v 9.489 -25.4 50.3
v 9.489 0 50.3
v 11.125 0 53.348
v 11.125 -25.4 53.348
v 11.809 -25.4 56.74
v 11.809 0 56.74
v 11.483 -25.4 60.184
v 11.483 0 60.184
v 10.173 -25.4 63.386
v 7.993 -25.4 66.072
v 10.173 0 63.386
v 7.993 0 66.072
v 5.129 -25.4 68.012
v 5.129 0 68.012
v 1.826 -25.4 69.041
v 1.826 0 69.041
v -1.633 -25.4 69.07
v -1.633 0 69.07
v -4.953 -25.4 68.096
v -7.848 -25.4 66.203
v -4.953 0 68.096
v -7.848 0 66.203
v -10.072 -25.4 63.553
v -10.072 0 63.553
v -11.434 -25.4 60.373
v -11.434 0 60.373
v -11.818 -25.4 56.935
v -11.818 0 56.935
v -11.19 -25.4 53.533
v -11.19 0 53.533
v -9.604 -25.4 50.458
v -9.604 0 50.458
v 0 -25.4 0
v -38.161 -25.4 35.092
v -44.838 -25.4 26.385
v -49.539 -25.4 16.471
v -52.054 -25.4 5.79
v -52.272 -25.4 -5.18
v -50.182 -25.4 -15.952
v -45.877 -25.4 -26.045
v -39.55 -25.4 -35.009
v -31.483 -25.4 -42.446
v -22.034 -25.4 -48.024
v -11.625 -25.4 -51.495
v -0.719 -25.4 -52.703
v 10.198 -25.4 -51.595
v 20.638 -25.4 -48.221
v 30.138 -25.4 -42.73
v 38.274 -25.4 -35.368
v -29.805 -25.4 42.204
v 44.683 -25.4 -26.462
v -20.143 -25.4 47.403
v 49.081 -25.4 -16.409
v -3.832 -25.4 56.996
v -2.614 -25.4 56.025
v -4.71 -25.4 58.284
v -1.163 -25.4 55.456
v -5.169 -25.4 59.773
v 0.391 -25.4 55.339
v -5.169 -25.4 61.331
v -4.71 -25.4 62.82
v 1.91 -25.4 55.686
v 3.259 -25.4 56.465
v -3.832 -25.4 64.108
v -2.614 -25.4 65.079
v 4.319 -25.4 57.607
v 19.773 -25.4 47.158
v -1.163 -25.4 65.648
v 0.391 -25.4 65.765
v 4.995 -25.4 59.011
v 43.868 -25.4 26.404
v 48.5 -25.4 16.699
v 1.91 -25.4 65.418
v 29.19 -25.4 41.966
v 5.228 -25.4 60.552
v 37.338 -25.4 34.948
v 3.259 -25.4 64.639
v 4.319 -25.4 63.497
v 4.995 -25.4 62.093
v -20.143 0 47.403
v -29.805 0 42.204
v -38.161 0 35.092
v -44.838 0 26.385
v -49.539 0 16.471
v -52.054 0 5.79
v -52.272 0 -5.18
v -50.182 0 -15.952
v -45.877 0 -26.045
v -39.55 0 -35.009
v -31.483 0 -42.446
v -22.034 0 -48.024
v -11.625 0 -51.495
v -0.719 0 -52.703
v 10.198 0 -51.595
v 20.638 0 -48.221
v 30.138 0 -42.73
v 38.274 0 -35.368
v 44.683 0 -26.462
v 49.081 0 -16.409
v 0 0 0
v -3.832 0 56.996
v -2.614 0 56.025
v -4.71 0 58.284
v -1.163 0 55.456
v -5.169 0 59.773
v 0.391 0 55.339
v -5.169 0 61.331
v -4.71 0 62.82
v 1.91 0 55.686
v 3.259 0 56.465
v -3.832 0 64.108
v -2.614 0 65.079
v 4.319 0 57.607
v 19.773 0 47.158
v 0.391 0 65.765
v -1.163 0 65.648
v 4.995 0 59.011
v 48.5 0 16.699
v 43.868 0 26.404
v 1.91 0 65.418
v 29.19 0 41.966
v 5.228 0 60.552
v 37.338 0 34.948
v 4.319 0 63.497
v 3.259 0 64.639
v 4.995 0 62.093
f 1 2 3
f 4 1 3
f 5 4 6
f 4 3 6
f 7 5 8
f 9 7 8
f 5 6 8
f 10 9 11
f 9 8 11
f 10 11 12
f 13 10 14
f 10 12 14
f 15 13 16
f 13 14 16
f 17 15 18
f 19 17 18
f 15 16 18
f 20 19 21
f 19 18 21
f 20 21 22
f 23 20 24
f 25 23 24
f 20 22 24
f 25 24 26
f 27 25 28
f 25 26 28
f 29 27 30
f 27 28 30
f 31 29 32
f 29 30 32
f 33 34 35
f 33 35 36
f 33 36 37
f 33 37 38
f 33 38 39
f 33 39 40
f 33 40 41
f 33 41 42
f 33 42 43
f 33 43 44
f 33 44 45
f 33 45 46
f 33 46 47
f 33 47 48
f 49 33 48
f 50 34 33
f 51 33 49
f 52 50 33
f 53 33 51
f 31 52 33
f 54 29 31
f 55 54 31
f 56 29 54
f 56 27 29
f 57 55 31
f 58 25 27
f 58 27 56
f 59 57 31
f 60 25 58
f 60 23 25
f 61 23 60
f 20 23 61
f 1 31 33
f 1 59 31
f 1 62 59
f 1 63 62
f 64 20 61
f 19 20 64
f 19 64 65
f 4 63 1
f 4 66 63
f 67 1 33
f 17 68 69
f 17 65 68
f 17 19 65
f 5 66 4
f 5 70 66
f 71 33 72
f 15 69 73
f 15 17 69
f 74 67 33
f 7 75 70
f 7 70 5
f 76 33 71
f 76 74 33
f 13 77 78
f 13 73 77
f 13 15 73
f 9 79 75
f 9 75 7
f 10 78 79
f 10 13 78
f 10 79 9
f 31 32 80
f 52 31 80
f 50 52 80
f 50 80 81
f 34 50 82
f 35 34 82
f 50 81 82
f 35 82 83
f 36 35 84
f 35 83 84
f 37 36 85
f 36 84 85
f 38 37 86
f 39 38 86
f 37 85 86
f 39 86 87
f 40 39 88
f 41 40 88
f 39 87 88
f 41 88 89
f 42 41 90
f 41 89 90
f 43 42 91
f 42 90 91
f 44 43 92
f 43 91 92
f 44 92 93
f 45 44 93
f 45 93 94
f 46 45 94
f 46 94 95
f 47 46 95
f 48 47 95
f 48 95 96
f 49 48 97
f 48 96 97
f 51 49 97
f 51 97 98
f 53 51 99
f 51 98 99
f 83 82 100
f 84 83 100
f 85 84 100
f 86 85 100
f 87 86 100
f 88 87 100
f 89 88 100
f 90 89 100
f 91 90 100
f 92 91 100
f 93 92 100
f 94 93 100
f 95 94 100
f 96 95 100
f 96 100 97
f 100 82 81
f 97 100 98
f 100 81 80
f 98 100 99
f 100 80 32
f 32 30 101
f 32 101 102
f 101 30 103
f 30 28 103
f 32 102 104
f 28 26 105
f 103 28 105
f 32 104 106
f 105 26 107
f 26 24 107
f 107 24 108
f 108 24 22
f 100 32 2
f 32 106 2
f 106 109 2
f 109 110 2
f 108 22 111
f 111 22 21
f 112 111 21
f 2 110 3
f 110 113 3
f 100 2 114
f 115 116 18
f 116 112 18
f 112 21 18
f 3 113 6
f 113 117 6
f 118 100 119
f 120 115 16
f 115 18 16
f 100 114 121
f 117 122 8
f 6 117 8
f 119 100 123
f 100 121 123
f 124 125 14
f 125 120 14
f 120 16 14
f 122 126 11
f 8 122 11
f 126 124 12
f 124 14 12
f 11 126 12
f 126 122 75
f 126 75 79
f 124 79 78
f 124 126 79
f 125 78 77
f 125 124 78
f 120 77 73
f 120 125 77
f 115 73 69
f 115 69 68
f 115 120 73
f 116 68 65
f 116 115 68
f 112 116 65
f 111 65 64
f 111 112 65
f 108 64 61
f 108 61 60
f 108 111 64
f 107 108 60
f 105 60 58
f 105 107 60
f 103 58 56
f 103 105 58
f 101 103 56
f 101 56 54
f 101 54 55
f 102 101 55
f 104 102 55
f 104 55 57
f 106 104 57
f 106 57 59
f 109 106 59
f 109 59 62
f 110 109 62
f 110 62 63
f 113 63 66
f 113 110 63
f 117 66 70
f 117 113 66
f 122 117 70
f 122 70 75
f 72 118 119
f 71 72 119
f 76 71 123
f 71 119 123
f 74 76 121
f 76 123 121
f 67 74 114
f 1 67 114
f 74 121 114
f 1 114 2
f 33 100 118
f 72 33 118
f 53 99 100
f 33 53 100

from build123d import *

# Parameters (mm, degrees)
F0_R     = 5.227515474
F1_DEPTH = 25.4
F2_DEPTH = 25.4


# Not quite as in the source:
# - a feature names something its author has since deleted; it is built from what else it names


with BuildPart() as f1:
    # F0 (on Front) → F1 (new body)
    with BuildSketch(Plane.XZ):
        with BuildLine():
            Line((0, 0), (48.4997071326, 16.699001193))
            ThreePointArc((48.4997071326, 16.699001193), (33.4463476719, 38.6685413288), (9.4887581342, 50.3003179933))
            ThreePointArc((9.4887581342, 50.3003179933), (0.0976286062, 69.1824149389), (-9.603985867, 50.457950314))
            ThreePointArc((-9.603985867, 50.457950314), (-39.5504687593, -35.0093012615), (49.08054322, -16.408585012))
            Line((49.08054322, -16.408585012), (0, 0))
        make_face()
        with Locations((0, 60.5520345271)):
            Circle(F0_R, mode=Mode.SUBTRACT)
    extrude(amount=F1_DEPTH)

    # F0 (on Front) → F2 (join)
    with BuildSketch(Plane.XZ):
        with BuildLine():
            Line((0, 0), (48.4997071326, 16.699001193))
            ThreePointArc((48.4997071326, 16.699001193), (33.4463476719, 38.6685413288), (9.4887581342, 50.3003179933))
            ThreePointArc((9.4887581342, 50.3003179933), (0.0976286062, 69.1824149389), (-9.603985867, 50.457950314))
            ThreePointArc((-9.603985867, 50.457950314), (-39.5504687593, -35.0093012615), (49.08054322, -16.408585012))
            Line((49.08054322, -16.408585012), (0, 0))
        make_face()
        with Locations((0, 60.5520345271)):
            Circle(F0_R, mode=Mode.SUBTRACT)
    extrude(amount=F2_DEPTH)


solid = f1.part
